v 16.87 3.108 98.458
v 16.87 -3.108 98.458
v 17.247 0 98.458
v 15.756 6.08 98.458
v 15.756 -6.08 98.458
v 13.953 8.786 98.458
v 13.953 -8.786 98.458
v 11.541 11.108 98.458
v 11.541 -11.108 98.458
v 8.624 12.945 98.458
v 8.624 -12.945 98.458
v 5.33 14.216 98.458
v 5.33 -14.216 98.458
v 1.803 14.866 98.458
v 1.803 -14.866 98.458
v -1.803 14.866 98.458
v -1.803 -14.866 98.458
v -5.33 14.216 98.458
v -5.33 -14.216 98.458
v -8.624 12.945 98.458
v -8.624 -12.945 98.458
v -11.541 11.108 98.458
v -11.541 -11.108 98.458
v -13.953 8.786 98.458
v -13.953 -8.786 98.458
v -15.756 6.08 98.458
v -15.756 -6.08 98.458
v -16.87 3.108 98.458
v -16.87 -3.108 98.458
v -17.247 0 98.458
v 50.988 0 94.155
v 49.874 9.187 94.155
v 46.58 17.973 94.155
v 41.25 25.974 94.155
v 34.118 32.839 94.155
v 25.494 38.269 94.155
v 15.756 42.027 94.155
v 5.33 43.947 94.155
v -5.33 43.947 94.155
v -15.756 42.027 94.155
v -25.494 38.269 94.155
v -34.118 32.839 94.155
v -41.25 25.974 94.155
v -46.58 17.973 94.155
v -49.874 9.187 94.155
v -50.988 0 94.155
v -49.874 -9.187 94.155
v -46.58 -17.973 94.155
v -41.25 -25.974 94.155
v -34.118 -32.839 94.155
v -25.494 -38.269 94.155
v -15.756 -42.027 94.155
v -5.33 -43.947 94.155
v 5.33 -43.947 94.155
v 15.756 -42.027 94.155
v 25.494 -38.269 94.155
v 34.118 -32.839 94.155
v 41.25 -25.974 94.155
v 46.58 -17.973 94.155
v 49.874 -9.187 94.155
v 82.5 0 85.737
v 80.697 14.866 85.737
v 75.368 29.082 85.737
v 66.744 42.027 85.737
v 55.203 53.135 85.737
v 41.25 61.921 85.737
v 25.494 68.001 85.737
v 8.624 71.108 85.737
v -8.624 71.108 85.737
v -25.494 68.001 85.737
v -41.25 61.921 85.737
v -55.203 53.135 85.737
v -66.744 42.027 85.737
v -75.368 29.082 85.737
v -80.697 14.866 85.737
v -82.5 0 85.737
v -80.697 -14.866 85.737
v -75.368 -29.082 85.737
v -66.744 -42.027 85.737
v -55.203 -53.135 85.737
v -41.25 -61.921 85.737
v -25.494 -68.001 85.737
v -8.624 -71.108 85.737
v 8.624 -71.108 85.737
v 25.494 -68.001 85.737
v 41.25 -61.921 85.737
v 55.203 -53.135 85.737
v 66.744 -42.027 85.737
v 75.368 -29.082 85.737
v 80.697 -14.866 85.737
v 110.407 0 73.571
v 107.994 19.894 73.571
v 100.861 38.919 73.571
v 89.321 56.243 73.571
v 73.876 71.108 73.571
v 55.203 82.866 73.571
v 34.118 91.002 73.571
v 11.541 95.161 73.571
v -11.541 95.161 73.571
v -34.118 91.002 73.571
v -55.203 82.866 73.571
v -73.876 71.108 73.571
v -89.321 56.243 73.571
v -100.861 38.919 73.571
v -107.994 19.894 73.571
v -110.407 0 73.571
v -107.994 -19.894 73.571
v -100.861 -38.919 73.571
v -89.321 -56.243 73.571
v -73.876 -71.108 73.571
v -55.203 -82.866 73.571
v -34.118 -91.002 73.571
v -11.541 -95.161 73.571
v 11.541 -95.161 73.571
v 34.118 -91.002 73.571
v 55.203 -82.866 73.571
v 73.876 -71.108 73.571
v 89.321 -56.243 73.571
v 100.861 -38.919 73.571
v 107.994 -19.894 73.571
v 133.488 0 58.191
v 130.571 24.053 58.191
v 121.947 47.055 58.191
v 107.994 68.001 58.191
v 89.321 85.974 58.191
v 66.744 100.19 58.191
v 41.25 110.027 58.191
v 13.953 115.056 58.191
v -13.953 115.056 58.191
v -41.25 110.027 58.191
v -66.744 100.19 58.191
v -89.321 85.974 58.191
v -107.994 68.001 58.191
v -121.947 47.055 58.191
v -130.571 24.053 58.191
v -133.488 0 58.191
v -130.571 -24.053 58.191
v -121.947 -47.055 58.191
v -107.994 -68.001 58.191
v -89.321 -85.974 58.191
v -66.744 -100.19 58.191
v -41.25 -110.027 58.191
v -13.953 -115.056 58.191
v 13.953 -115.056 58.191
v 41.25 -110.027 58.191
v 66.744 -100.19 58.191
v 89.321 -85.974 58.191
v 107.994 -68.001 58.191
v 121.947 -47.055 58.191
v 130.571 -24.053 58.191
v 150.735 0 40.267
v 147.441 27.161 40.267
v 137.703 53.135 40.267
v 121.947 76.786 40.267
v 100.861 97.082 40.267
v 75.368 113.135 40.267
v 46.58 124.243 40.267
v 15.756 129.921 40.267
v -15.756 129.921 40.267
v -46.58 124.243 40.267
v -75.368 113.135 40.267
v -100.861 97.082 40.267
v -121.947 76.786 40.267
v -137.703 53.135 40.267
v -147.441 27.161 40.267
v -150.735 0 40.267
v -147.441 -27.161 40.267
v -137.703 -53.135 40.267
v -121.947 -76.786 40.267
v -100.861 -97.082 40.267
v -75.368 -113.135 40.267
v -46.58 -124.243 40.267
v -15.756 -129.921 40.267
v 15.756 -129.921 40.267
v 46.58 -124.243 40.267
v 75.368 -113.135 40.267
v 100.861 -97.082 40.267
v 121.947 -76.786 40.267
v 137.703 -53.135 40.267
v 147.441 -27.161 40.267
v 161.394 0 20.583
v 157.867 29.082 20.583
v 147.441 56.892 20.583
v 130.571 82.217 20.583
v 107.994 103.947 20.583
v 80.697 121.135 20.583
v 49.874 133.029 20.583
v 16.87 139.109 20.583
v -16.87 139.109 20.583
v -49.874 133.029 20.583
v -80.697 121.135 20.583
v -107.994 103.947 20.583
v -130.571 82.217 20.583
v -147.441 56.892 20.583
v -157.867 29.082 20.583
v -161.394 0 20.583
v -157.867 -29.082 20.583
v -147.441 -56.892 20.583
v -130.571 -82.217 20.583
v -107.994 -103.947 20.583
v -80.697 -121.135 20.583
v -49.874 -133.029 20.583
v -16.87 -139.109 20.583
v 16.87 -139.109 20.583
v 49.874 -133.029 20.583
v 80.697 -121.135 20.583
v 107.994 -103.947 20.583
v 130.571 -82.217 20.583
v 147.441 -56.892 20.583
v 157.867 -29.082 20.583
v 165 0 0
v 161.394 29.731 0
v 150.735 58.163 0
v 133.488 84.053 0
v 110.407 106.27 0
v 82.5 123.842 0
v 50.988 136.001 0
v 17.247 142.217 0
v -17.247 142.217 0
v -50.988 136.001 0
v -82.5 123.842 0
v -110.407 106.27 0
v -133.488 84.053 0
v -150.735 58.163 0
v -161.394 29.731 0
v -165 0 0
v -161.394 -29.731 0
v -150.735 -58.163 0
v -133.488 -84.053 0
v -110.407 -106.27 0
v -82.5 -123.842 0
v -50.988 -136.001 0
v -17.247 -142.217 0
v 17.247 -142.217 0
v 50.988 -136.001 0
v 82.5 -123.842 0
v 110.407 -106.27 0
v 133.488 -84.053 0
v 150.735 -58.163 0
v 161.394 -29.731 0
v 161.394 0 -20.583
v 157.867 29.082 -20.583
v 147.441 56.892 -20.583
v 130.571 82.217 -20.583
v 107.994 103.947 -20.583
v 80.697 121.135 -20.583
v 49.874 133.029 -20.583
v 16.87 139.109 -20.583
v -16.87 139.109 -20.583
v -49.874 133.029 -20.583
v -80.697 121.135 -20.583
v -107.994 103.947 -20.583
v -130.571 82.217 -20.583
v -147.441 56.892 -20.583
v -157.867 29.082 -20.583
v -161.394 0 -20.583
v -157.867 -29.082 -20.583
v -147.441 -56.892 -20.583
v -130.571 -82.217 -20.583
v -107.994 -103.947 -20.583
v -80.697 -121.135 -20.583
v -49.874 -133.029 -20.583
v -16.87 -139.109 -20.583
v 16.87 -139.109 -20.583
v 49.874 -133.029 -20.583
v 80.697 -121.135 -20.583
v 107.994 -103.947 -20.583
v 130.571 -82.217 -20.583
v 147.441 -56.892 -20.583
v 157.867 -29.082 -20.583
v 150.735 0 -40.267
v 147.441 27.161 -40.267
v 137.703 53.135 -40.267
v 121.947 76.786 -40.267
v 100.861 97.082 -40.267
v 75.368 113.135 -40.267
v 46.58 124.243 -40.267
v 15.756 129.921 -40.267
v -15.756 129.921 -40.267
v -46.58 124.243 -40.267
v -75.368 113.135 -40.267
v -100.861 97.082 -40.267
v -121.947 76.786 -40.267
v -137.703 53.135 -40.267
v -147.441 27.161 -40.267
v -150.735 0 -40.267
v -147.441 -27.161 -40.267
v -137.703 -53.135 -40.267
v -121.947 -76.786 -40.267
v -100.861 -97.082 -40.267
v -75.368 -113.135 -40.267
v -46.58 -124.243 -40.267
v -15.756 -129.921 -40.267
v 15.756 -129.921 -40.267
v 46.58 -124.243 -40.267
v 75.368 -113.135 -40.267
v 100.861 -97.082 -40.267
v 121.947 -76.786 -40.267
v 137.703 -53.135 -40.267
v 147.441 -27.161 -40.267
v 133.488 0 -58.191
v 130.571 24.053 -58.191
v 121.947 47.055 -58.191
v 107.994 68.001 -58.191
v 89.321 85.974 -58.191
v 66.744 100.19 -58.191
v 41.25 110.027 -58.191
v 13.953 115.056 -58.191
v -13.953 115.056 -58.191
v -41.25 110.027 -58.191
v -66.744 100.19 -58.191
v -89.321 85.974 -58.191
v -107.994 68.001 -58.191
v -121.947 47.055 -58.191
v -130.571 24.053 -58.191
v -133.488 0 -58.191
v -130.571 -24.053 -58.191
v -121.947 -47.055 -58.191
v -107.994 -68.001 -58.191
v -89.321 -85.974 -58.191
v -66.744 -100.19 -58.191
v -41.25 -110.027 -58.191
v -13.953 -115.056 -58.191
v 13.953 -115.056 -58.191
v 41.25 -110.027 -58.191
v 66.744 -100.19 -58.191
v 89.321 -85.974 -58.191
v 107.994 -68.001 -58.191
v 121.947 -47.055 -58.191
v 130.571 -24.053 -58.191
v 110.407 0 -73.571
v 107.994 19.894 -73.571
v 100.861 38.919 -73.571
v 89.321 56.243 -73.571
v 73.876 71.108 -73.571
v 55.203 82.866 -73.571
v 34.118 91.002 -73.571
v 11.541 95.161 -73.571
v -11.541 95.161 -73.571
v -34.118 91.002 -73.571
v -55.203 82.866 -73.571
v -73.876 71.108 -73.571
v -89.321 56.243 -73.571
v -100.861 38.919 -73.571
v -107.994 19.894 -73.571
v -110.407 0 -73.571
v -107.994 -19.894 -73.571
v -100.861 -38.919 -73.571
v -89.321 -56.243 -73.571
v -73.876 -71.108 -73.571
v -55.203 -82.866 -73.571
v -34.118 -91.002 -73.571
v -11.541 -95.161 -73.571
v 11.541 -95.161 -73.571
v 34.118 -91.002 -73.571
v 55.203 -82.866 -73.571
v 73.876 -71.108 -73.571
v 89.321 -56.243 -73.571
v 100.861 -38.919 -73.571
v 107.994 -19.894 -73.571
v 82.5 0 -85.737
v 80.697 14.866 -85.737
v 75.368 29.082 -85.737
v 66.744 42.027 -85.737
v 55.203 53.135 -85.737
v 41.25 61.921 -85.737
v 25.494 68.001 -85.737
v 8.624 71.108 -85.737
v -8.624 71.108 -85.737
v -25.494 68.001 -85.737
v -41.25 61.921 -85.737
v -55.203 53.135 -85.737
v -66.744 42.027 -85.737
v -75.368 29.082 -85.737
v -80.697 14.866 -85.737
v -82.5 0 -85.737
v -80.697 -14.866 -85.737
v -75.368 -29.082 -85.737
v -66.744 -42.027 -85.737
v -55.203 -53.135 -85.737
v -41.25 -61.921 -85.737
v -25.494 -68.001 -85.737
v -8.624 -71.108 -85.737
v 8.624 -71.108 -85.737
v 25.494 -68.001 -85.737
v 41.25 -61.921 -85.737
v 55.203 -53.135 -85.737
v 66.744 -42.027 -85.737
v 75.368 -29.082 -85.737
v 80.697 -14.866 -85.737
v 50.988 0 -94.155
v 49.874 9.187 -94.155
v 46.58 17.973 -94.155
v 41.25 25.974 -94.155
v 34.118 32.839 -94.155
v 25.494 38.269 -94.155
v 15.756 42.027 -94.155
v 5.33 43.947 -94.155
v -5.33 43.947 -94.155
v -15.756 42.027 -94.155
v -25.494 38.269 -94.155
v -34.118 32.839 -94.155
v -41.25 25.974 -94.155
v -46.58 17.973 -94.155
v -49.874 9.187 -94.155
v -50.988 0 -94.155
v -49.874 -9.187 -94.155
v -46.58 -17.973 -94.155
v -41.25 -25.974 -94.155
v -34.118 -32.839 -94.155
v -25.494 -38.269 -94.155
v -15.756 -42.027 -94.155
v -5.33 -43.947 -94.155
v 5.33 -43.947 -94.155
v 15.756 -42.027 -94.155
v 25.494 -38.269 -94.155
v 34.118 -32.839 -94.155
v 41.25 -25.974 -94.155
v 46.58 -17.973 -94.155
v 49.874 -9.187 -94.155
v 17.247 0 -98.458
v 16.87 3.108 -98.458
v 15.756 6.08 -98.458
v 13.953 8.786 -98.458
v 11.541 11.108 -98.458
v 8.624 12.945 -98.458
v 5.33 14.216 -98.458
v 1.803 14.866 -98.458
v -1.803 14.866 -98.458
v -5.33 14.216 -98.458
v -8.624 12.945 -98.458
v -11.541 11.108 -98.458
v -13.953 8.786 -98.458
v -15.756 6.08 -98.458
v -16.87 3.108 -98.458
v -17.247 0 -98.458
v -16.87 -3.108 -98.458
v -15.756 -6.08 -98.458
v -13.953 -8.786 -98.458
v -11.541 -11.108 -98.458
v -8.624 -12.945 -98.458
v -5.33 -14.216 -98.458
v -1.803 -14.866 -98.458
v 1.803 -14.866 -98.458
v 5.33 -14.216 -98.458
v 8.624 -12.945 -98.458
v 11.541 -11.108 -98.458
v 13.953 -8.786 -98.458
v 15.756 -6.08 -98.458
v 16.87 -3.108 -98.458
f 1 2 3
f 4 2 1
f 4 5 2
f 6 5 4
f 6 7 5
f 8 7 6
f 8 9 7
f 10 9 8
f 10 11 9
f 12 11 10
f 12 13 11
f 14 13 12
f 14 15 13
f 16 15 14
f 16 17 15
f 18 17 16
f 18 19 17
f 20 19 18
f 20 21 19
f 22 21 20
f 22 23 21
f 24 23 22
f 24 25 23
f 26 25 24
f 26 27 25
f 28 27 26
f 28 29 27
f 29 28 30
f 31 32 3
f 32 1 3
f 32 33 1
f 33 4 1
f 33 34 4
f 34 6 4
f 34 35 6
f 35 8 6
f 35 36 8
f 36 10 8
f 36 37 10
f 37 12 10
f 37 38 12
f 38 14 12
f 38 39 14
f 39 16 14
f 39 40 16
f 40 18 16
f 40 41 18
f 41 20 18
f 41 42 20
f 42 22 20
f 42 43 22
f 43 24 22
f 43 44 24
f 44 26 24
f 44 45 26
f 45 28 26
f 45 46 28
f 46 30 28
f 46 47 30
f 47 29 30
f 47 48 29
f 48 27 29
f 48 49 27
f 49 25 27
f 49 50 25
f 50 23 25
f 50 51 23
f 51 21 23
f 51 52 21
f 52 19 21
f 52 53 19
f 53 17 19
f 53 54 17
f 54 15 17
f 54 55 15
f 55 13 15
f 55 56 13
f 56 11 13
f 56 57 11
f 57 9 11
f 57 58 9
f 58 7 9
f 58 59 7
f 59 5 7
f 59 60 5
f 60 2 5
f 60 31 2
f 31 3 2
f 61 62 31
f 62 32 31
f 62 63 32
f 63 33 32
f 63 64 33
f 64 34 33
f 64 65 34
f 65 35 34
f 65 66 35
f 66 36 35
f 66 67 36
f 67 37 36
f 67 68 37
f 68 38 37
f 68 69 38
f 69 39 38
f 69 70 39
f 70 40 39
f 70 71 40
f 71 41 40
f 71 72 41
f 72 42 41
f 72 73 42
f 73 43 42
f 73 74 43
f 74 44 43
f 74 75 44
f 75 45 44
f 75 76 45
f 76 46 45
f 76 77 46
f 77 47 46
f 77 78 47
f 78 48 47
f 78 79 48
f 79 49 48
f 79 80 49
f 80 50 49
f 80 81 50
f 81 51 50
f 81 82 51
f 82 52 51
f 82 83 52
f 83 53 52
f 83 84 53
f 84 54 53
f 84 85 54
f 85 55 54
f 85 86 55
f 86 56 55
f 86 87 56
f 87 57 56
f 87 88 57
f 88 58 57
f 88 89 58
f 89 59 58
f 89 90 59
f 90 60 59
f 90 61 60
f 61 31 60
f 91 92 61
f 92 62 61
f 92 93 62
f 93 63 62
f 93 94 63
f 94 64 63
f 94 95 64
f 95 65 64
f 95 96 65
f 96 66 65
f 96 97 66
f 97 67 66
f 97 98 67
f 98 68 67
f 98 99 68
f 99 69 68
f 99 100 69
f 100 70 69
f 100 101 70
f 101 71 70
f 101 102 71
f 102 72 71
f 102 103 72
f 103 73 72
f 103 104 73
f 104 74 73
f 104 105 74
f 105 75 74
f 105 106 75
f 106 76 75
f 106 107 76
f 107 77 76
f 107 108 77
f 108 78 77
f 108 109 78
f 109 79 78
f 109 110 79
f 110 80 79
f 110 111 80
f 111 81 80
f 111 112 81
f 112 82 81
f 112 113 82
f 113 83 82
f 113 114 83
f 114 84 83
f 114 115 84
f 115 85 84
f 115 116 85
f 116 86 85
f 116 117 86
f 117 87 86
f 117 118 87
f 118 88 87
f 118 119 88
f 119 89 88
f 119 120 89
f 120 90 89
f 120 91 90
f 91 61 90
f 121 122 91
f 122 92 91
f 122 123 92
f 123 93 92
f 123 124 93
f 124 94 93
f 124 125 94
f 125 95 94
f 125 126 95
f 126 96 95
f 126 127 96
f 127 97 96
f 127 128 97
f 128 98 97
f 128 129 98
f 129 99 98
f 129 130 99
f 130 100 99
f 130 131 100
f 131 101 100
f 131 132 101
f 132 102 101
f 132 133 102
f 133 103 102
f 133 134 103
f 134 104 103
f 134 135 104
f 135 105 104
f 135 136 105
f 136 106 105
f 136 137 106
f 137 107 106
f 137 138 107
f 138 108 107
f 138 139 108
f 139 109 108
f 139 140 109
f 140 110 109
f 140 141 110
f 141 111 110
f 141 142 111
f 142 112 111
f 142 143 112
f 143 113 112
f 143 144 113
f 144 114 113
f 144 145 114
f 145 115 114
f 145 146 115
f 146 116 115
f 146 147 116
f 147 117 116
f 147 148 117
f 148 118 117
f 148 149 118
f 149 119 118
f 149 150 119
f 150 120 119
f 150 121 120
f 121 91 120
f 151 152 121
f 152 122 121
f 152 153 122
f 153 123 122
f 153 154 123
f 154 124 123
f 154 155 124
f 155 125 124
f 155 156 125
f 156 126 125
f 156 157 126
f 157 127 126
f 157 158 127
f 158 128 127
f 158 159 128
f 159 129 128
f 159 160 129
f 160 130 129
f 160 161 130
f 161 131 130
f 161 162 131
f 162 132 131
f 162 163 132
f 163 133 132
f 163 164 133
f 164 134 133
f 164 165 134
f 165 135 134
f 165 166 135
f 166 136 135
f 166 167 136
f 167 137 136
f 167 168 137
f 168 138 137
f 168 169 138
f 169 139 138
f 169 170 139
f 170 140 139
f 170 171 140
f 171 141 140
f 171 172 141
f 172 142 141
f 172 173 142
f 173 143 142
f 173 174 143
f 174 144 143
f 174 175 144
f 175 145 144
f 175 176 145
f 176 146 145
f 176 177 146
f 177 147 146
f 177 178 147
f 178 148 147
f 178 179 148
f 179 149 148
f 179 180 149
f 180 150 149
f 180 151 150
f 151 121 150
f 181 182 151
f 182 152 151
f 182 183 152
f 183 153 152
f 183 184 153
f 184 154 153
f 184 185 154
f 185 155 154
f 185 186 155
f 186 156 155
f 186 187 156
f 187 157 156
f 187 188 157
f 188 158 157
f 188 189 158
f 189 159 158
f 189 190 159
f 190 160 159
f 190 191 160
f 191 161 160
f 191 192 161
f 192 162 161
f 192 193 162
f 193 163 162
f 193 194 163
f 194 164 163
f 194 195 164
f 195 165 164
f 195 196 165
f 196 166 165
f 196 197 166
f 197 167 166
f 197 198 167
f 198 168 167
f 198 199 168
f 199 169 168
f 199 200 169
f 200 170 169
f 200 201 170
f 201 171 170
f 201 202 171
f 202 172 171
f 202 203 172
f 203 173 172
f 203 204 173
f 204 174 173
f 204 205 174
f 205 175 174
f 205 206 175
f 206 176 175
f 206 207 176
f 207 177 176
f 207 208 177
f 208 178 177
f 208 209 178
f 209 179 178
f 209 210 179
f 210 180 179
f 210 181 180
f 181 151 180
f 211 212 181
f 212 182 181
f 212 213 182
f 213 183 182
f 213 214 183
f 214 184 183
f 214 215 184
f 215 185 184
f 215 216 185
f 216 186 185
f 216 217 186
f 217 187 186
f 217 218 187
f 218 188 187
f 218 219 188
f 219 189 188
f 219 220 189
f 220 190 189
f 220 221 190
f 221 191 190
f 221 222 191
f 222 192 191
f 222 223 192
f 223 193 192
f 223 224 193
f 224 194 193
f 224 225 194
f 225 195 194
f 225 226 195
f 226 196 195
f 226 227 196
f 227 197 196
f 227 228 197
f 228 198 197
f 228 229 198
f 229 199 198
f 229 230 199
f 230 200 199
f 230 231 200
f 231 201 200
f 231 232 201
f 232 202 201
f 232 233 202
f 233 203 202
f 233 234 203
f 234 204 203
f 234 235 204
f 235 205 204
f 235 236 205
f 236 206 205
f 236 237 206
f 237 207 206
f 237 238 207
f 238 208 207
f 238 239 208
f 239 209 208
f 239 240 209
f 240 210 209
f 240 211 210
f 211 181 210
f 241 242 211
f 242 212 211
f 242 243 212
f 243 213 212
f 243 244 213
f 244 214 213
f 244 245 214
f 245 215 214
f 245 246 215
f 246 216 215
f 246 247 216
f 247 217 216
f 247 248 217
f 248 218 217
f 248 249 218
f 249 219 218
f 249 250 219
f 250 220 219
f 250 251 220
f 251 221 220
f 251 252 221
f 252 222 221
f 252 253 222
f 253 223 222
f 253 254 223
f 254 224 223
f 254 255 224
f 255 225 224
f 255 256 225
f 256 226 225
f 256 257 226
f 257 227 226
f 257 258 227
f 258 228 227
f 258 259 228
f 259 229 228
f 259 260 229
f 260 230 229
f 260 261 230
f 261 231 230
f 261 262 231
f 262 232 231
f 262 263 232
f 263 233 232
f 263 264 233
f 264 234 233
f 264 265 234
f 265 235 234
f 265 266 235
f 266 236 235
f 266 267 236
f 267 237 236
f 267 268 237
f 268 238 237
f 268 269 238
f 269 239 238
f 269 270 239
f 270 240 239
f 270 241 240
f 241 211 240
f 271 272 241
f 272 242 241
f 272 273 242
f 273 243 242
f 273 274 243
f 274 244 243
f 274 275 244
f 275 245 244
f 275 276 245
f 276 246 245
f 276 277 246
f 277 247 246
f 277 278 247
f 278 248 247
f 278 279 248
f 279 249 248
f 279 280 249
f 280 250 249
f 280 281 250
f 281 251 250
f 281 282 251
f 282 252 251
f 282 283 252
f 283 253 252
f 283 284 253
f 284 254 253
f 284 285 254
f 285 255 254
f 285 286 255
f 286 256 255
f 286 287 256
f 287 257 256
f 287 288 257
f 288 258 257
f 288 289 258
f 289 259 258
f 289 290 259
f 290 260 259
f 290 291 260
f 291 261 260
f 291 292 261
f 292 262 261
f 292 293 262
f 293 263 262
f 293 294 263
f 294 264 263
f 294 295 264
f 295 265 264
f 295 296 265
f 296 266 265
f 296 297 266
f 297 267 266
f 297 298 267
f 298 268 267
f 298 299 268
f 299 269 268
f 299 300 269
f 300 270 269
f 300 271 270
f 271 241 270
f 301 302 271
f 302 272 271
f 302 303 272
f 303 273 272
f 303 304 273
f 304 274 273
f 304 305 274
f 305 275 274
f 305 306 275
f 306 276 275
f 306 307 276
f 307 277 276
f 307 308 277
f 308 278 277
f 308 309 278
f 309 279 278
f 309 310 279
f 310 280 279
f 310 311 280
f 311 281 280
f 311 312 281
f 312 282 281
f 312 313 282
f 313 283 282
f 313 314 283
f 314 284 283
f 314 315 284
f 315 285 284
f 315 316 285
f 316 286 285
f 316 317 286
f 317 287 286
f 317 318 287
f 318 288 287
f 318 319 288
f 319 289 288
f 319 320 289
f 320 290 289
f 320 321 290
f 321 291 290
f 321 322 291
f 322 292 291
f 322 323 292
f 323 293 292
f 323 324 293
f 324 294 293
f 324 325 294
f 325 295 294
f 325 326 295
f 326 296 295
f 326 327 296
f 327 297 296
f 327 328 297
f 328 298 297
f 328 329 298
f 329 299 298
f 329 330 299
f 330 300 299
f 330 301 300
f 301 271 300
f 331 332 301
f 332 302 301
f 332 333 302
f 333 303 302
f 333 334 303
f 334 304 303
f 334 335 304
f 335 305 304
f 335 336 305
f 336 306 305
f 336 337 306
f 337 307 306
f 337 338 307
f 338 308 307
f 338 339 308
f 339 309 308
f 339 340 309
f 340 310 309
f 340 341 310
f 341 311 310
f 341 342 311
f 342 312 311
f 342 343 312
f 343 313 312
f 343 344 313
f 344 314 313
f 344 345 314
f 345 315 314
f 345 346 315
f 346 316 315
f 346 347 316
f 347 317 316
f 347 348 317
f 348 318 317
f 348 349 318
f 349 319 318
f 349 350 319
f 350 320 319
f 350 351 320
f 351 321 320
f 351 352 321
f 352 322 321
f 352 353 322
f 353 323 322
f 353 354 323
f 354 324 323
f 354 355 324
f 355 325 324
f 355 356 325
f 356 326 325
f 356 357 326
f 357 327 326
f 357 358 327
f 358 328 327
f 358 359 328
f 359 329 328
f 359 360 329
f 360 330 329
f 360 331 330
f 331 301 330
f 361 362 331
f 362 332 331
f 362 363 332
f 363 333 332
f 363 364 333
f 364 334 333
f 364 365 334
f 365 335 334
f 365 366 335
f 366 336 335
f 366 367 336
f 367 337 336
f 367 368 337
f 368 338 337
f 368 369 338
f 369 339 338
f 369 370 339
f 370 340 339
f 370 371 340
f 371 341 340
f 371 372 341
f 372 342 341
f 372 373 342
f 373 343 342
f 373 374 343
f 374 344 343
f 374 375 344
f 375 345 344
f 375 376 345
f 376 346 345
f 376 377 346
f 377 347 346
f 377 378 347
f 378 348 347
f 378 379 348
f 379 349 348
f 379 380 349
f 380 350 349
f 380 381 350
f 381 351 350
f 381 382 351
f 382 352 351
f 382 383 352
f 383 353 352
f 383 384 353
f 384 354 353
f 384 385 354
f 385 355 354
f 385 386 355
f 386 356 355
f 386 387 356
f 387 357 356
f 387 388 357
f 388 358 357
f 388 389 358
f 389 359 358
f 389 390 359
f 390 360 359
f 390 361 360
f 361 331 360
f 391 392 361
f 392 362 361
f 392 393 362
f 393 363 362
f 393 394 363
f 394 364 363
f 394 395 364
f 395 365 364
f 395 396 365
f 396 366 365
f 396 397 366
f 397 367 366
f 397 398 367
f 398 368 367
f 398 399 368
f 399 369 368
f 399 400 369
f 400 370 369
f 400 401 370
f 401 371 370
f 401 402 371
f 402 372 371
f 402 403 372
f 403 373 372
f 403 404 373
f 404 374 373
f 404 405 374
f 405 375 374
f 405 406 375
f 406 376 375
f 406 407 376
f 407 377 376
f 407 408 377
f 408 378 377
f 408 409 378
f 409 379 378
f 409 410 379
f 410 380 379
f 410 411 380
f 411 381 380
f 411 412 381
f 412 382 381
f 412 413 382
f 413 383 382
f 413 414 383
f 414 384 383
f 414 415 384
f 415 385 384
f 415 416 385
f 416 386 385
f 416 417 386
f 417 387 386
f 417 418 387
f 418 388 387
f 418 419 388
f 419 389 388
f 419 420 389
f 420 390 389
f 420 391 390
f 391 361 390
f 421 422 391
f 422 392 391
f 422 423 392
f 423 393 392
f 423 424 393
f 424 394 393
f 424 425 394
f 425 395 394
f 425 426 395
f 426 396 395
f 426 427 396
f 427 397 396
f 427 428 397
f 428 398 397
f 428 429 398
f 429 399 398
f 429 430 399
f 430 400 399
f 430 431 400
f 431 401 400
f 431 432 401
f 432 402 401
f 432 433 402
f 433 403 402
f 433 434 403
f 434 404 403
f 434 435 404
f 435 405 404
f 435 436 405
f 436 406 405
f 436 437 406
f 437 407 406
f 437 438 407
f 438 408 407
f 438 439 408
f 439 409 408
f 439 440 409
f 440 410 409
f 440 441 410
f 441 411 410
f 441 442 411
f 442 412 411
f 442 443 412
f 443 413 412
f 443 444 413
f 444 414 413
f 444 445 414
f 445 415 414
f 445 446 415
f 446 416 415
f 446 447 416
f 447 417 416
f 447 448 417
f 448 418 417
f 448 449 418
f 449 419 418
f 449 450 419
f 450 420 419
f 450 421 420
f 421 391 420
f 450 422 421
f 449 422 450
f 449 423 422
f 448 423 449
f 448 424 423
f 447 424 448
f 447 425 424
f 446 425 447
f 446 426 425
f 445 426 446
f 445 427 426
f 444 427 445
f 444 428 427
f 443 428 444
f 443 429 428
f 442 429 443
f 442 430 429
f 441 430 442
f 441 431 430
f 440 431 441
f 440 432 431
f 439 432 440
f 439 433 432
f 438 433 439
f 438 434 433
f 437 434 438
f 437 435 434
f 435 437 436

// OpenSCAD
// Generated by SolidPython 1.0.1 on 2020-07-29 00:46:52


scale(v = [15, 13, 9]) {
	sphere(r = 11);
}
/***********************************************
*********      SolidPython code:      **********
************************************************
 
# import packages: SolidPython
from solid import *
from solid.utils import *
from itertools import chain, combinations, permutations


class Resize:

    def __init__(self, scad_file):
        self.scad_file = scad_file
        #self.scad_file = import_scad(scad_file)
        # cone/cylinder param:
        self.r1 = 0
        self.r2 = 0
        self.h = 0
        # rectangular prism param:
        self.w = 0
        self.l = 0
        # ellipse param:
        self.r = 0

    # import OpenScad code (file name corresponds to shape)


    # classify shape + parameters
    def assign(self, param1, param2, param3):
        if self.scad_file == 'cone.scad':
            self.r1 = param1
            self.r2 = param2
            self.h = param3
        elif self.scad_file == 'cylinder.scad':
            self.r1 = param1
            self.r2 = param2
            self.h = param3
        elif self.scad_file == 'rectangularPrism.scad':
            self.h = param1
            self.l = param2
            self.w = param3
        else:
            self.r = param1
            self.h = param2

    # resize parameters
    def iterate(self):
        x = range(3, 20, 2)
        i = 1
        if self.scad_file == 'cone.scad':
            tempList = list(permutations(x, 2))
            for temp in tempList:
                param1 = temp[0]
                param2 = temp[1]
                filepath = 'produced_scad_files/' + 'cone' + str(param1) + '_' + str(param2) + '_' + '.scad'
                scad_render_to_file(cylinder(h=param1, r1=param2, r2=0), filepath)

        elif self.scad_file == 'cylinder.scad':
            tempList = list(permutations(x, 3))
            for temp in tempList:
                param1 = temp[0]
                param2 = temp[1]
                filepath = 'produced_scad_files/' + 'cylinder' + str(param1) + '_' + str(param2) + '_' + '.scad'
                scad_render_to_file(cylinder(h=param1, r1=param2, r2=param2), filepath)

        elif self.scad_file == 'rectangularPrism.scad':
            tempList = list(permutations(x, 3))
            for temp in tempList:
                param1 = temp[0]
                param2 = temp[1]
                param3 = temp[2]
                filepath = 'produced_scad_files/' + 'rectangularPrism' + str(param1) + '_' + str(param2) + '_' + str(
                    param3) + '.scad'
                scad_render_to_file(cube(size=(param1, param2, param3)), filepath)

        elif self.scad_file == 'ellipse.scad':
            tempList = list(permutations(x, 4))
            for temp in tempList:
                param1 = temp[0]
                param2 = temp[1]
                param3 = temp[2]
                param4 = temp[3]
                filepath = 'produced_scad_files/' + 'ellipse' + str(param1) + '_' + str(param2) + '_' + str(param3) + '_' + str(param4) + '.scad'
                scad_render_to_file(scale([param1, param2, param3])(sphere(r=param4)), filepath)

    def render_to_scadfile(self):
        scad_render_to_file(scad, 'example.scad') 
 
************************************************/
